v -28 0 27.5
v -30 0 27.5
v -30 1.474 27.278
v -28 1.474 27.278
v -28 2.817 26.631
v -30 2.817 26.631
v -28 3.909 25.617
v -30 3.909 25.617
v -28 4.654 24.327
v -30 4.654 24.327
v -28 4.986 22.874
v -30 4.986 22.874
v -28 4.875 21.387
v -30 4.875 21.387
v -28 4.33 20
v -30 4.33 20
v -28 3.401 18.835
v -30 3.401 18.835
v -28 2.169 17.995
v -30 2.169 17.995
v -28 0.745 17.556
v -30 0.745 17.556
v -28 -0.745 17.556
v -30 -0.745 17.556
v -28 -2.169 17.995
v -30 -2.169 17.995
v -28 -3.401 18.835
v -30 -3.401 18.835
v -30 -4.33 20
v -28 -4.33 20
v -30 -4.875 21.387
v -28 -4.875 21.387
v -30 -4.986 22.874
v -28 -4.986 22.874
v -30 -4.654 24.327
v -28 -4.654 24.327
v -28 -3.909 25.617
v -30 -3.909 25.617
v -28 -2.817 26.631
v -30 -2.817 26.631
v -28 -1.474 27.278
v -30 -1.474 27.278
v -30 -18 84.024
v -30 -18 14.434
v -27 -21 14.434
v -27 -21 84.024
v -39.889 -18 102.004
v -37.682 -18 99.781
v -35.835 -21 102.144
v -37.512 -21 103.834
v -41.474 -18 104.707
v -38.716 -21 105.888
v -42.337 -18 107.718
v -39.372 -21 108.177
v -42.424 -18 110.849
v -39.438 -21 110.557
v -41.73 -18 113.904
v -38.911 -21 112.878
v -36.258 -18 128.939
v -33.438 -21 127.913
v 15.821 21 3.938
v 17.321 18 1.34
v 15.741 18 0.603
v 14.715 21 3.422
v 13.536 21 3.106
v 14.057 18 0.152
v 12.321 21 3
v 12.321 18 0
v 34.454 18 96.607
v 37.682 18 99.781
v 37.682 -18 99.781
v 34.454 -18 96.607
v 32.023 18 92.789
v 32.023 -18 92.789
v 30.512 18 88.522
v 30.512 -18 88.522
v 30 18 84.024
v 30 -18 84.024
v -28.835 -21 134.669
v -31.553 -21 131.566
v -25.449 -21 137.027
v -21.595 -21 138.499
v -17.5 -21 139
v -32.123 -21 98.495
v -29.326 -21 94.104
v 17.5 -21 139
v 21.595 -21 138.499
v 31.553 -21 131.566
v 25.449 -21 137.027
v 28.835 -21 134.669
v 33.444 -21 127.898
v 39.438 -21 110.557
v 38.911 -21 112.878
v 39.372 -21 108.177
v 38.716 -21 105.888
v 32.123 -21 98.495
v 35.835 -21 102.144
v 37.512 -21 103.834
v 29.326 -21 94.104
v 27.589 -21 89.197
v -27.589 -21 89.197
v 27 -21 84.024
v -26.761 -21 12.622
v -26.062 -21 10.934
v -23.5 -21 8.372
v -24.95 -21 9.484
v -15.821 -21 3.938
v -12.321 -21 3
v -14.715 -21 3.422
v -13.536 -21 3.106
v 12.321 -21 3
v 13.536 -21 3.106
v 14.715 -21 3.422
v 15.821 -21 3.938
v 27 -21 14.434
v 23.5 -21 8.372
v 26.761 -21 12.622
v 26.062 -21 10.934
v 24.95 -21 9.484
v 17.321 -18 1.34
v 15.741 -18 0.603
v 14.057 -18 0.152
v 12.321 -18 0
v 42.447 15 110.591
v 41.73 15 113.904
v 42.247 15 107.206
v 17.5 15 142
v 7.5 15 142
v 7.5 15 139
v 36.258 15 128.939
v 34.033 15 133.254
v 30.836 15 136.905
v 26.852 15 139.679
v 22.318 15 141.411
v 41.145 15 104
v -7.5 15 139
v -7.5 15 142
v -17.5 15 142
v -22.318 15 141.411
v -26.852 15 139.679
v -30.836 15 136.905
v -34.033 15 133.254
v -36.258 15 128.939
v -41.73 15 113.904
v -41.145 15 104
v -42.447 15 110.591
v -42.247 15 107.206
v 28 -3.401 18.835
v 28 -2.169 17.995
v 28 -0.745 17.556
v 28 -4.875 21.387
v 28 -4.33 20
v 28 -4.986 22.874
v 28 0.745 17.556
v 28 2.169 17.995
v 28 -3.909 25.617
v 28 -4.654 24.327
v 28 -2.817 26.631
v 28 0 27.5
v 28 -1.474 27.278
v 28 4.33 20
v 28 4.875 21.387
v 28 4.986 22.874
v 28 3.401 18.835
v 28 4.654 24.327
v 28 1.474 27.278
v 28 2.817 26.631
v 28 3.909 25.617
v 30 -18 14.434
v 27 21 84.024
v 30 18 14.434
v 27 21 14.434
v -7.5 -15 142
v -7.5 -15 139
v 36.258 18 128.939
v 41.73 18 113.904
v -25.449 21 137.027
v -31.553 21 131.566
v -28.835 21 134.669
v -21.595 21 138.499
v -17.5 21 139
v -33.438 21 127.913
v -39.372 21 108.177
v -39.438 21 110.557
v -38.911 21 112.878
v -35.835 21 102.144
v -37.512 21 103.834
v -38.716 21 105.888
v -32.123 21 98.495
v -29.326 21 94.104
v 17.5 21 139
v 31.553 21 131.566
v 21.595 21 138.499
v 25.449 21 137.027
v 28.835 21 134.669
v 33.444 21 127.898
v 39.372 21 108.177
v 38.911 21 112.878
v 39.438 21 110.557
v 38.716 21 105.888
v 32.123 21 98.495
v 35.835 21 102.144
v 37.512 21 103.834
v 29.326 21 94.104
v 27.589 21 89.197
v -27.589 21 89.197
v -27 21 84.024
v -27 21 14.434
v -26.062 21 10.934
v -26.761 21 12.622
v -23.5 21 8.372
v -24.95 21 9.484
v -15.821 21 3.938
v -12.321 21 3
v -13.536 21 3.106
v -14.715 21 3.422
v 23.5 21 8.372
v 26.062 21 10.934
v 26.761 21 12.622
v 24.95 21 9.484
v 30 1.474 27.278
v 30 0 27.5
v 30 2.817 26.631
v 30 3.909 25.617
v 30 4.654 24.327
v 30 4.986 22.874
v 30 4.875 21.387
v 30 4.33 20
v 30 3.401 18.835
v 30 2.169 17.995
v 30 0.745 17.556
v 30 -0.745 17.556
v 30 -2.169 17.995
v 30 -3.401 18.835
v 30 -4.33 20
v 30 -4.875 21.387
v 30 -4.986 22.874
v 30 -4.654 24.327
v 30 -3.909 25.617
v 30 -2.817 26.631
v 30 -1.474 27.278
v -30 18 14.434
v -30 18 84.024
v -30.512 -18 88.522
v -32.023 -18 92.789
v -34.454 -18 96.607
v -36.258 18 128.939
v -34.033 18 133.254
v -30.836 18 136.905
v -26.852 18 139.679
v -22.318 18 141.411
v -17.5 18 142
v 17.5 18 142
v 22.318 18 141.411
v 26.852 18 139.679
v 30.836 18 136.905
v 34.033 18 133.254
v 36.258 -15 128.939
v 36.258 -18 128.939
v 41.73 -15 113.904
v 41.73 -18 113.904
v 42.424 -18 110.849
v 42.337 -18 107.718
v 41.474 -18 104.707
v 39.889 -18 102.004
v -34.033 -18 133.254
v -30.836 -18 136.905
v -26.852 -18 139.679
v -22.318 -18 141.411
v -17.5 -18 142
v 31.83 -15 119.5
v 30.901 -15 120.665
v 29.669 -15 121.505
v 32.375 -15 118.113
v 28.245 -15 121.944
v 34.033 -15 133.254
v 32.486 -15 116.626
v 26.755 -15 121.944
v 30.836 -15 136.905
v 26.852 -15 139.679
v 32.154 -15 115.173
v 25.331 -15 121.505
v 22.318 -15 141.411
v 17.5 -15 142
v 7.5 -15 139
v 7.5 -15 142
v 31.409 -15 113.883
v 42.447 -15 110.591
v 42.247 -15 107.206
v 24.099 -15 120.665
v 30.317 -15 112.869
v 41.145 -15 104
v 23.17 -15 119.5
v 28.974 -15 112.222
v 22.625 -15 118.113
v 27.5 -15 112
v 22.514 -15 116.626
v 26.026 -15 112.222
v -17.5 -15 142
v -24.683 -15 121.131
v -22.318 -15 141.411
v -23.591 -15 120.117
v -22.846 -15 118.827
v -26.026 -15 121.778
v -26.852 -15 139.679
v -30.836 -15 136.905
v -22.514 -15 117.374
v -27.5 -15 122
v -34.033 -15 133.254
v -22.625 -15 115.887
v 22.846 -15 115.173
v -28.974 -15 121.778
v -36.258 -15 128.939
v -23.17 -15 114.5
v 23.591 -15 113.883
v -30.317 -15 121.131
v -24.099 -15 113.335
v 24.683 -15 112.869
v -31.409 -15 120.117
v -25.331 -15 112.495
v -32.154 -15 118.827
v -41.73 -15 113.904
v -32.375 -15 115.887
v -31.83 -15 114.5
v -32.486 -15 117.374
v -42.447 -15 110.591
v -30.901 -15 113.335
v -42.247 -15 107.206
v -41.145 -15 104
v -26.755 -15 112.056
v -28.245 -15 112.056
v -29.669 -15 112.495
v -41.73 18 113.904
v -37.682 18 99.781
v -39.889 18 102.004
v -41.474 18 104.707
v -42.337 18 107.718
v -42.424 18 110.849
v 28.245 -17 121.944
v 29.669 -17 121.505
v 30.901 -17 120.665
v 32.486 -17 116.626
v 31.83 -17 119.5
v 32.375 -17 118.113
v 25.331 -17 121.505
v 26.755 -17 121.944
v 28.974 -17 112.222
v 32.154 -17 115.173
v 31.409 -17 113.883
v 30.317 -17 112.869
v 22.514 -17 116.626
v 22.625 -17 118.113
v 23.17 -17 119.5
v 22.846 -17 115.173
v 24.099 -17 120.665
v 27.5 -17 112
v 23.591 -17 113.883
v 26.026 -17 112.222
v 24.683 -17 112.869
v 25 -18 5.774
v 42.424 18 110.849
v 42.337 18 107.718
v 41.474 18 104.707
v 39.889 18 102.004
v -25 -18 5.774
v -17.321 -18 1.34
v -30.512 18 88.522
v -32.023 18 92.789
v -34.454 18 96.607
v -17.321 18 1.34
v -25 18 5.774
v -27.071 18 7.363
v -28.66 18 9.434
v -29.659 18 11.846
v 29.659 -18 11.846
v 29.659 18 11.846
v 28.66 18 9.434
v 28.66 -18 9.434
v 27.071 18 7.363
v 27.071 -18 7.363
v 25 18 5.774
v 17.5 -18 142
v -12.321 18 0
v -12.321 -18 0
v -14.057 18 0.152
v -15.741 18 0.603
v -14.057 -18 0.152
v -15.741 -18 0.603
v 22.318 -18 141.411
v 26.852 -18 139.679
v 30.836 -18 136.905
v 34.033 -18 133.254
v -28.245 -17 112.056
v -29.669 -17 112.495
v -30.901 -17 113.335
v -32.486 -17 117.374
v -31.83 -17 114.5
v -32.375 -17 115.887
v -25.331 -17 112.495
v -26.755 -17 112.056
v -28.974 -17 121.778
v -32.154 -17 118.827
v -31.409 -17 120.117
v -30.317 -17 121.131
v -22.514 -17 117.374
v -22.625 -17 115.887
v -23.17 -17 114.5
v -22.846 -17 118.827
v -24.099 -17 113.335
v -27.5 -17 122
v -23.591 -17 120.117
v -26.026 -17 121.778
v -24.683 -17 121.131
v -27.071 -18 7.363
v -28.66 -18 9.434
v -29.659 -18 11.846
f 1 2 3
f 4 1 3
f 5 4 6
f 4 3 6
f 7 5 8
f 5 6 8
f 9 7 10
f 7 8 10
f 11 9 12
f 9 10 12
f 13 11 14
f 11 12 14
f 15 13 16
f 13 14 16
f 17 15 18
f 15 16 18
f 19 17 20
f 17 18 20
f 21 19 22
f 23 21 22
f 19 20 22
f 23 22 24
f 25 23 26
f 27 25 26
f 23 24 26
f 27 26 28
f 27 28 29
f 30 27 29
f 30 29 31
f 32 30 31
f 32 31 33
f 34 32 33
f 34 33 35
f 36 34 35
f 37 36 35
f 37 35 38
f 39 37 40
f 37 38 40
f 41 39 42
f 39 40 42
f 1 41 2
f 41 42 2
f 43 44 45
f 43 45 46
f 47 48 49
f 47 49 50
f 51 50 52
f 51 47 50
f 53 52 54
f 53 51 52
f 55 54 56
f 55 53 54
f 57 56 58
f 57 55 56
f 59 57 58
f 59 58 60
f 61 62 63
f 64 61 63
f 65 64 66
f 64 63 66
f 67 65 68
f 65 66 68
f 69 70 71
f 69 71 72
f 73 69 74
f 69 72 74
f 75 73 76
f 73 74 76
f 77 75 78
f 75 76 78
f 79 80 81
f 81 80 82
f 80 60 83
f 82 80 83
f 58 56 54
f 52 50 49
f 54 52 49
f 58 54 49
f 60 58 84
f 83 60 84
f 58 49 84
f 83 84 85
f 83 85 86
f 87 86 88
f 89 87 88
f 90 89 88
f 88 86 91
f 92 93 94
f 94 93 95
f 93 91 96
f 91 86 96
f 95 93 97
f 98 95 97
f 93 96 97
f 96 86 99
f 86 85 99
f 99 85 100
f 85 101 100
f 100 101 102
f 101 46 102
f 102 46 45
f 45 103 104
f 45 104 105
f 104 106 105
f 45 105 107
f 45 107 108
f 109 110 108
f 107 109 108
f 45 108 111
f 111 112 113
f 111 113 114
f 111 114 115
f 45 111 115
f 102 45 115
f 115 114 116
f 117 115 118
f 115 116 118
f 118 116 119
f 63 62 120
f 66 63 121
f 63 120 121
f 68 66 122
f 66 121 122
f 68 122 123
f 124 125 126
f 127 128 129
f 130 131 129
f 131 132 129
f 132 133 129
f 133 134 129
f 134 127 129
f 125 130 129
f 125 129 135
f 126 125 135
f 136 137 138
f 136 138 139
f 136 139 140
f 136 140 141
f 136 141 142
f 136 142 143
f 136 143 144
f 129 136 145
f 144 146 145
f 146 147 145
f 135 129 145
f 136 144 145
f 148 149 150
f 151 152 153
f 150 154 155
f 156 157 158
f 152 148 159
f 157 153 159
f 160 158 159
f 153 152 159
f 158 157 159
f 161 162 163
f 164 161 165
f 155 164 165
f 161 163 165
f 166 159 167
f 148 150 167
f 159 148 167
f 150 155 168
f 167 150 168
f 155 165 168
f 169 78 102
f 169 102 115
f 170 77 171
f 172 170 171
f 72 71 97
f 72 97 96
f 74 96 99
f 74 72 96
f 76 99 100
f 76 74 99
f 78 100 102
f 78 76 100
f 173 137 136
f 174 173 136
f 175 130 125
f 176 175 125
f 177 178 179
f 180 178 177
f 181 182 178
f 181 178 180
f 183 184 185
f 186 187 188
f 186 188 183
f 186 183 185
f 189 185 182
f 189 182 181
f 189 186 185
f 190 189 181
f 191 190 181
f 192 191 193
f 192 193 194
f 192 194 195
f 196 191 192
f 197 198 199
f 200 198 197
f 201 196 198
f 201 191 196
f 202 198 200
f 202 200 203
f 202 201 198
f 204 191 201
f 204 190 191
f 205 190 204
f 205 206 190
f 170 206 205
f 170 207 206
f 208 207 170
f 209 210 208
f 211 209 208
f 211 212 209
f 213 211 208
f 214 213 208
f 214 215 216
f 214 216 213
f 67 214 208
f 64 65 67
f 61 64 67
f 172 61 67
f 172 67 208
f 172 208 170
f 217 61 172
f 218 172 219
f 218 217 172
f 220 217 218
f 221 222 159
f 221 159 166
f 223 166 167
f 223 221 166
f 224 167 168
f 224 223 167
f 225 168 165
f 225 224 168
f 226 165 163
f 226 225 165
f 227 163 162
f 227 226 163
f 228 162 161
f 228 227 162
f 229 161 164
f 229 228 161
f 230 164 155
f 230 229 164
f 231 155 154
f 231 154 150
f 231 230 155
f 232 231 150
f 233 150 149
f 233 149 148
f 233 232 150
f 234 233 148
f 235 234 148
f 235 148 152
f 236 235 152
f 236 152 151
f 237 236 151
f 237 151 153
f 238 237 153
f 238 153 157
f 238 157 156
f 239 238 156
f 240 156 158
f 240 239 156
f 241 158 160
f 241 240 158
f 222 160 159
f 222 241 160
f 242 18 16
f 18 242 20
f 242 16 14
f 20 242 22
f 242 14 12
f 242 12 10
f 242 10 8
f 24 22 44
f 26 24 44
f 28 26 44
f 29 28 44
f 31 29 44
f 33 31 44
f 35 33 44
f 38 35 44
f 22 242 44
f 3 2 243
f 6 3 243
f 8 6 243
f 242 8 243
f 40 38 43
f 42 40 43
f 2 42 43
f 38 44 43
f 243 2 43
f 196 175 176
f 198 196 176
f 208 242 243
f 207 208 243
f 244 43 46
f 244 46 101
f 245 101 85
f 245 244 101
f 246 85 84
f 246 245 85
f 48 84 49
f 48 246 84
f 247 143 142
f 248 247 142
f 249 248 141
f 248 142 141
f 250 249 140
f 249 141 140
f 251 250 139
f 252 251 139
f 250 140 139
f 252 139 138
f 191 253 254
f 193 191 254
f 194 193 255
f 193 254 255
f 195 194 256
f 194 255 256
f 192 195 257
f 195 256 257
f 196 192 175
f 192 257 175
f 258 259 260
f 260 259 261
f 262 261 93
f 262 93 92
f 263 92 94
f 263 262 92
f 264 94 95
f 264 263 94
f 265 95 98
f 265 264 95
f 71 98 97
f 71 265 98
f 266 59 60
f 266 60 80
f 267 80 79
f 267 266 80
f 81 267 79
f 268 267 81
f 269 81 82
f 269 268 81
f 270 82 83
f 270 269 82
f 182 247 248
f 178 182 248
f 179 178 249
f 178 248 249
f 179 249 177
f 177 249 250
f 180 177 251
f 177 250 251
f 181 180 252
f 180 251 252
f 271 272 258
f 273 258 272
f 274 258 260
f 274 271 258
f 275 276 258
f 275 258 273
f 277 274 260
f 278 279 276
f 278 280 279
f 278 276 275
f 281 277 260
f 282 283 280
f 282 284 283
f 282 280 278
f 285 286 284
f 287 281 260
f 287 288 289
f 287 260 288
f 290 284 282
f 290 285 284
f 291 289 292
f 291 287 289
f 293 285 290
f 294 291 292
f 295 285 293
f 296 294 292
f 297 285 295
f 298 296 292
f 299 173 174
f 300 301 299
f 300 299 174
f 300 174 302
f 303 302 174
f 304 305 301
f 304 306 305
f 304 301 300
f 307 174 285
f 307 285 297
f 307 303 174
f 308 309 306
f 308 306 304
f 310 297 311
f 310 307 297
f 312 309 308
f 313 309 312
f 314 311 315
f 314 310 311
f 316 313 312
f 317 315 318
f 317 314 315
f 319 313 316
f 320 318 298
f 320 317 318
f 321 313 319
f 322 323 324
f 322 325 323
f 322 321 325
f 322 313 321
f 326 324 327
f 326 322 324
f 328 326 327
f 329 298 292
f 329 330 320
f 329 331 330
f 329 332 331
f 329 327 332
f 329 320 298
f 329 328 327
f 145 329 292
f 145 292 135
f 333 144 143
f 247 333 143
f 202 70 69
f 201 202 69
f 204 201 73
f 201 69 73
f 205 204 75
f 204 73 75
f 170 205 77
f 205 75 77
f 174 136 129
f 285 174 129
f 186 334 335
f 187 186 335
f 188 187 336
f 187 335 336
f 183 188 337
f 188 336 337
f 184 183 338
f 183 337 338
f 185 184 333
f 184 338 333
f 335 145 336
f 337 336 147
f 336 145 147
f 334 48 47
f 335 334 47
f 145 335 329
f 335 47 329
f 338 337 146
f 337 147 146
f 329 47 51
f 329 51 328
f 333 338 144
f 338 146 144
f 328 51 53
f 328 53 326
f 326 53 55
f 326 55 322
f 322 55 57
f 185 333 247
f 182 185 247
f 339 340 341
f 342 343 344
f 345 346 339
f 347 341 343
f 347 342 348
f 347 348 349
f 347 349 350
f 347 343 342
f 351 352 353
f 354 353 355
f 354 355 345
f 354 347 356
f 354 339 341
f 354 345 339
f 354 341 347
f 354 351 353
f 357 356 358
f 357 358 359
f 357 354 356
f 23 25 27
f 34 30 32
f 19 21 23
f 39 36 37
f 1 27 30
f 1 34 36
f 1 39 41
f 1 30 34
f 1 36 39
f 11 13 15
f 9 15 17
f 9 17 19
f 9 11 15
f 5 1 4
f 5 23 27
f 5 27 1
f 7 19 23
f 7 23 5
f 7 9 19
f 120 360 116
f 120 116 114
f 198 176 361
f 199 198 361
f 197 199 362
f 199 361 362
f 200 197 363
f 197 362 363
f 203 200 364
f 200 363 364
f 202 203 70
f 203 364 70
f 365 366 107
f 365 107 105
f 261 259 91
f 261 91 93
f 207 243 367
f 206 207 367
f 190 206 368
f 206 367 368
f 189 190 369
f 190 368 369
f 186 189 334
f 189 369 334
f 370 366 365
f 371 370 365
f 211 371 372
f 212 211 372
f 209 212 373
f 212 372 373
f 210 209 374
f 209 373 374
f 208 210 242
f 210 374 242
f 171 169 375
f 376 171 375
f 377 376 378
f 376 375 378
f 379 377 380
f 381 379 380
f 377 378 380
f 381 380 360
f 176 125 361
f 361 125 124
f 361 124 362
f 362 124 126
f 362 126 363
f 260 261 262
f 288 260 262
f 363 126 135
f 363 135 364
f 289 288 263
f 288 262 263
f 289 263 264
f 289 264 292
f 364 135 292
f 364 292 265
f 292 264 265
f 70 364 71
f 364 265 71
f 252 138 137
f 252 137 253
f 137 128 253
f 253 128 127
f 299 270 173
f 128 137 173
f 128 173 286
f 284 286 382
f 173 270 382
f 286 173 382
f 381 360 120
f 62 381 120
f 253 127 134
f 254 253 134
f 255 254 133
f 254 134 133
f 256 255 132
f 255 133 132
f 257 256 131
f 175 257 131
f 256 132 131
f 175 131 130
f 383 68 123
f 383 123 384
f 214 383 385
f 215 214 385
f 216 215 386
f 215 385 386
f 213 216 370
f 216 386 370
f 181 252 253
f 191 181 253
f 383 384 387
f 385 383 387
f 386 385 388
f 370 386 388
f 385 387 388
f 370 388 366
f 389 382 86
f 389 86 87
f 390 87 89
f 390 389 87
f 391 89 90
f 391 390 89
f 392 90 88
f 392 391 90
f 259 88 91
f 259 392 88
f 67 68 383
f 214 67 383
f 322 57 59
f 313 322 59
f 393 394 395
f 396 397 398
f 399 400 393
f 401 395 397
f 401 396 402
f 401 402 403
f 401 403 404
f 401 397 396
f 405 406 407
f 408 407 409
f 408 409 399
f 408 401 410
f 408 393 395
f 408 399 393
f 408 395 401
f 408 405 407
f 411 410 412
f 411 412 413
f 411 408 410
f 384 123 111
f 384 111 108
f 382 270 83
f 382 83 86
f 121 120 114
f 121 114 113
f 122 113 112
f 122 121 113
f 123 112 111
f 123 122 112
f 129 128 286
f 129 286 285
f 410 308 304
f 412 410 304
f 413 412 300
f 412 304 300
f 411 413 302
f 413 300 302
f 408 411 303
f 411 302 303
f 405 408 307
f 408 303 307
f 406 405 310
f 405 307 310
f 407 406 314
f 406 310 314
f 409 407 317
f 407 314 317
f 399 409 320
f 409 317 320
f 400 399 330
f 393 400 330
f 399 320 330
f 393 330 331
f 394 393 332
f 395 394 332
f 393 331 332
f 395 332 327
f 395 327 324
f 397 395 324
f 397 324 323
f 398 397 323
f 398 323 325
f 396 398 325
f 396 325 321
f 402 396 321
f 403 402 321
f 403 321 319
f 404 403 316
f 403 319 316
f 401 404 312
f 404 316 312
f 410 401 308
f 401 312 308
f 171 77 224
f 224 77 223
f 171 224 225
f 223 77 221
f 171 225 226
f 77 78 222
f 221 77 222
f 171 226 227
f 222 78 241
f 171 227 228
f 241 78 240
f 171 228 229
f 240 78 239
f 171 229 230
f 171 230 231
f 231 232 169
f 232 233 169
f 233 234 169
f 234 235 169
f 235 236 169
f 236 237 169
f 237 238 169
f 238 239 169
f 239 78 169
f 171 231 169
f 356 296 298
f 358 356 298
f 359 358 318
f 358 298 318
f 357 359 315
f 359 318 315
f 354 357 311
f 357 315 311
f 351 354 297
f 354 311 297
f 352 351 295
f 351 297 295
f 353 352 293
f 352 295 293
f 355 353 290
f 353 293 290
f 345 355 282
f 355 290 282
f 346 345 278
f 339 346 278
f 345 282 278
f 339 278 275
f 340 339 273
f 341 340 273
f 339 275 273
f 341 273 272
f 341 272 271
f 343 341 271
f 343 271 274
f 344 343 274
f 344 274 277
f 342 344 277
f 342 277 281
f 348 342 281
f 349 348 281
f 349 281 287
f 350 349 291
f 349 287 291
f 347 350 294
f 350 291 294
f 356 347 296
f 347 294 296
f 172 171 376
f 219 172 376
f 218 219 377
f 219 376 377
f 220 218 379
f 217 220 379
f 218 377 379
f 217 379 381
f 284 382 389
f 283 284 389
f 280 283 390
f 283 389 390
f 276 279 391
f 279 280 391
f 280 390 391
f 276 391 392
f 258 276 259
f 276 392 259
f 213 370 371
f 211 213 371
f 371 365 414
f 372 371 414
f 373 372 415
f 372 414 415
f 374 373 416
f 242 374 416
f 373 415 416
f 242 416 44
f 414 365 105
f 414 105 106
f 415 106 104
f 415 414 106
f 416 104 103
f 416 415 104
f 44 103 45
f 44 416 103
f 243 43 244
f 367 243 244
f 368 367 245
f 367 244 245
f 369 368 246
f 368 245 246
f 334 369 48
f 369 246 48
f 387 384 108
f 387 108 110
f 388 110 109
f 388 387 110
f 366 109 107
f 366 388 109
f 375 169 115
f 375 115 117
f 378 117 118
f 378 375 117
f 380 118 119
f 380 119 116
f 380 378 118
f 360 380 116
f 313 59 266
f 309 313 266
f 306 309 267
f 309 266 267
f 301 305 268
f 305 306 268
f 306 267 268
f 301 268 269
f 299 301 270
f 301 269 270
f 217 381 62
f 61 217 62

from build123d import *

# Parameters (mm, degrees)
BOSS_EXTRUDE1_DEPTH      = 21
BOSS_EXTRUDE1_DEPTH_BACK = 21
CUT_EXTRUDE2_DEPTH       = 150.699259177
CUT_EXTRUDE2_DEPTH_BACK  = 150.699259177
SKETCH3_W                = 38
SKETCH3_H                = 30
CHAMFER1_SIZE            = 3
BOSS_EXTRUDE2_REACH      = 154.528
SKETCH4_W                = 15
SKETCH4_H                = 3
SKETCH5_R                = 5
CUT_EXTRUDE3_DEPTH       = 2
SKETCH6_R                = 5
CUT_EXTRUDE4_DEPTH       = 2


with BuildPart() as part:
    # Sketch1 → Boss-Extrude1 (new, two sides: drawn at the far end of the back side and taken through both)
    with BuildSketch(Plane(origin=(0, 0, 0), x_dir=(1, 0, 0), z_dir=(0, 1, 0)).offset(-BOSS_EXTRUDE1_DEPTH_BACK)):
        with BuildLine():
            Line((12.320508076, 0), (-12.320508076, 0))
            ThreePointArc((-12.320508076, 0), (-14.908698527, -0.340741737), (-17.320508076, -1.339745962))
            Line((-17.320508076, -1.339745962), (-25, -5.773502692))
            ThreePointArc((-25, -5.773502692), (-28.660254038, -9.43375673), (-30, -14.43375673))
            Line((-30, -14.43375673), (-30, -84.024253192))
            ThreePointArc((-30, -84.024253192), (-32.022876143, -92.789127283), (-37.682301783, -99.780975904))
            ThreePointArc((-37.682301783, -99.780975904), (-42, -106.185164374), (-41.729898157, -113.904179391))
            Line((-41.729898157, -113.904179391), (-36.257575864, -128.939261324))
            ThreePointArc((-36.257575864, -128.939261324), (-28.928358883, -138.413184128), (-17.5, -142))
            Line((-17.5, -142), (17.5, -142))
            ThreePointArc((17.5, -142), (28.928358883, -138.413184128), (36.257575864, -128.939261324))
            Line((36.257575864, -128.939261324), (41.729898157, -113.904179391))
            ThreePointArc((41.729898157, -113.904179391), (42, -106.185164374), (37.682301783, -99.780975904))
            ThreePointArc((37.682301783, -99.780975904), (32.022876143, -92.789127283), (30, -84.024253192))
            Line((30, -84.024253192), (30, -14.43375673))
            ThreePointArc((30, -14.43375673), (28.660254038, -9.43375673), (25, -5.773502692))
            Line((25, -5.773502692), (17.320508076, -1.339745962))
            ThreePointArc((17.320508076, -1.339745962), (14.908698527, -0.340741737), (12.320508076, 0))
        make_face()
    extrude(amount=BOSS_EXTRUDE1_DEPTH + BOSS_EXTRUDE1_DEPTH_BACK)

    # Sketch3 → Cut-Extrude2 (cut, two sides: drawn at the far end of the back side and taken through both)
    with BuildSketch(Plane(origin=(0, 0, 0), x_dir=(0, 0, -1), z_dir=(1, 0, 0)).offset(-CUT_EXTRUDE2_DEPTH_BACK)):
        with Locations((-123, 0)):
            Rectangle(SKETCH3_W, SKETCH3_H)
    extrude(amount=CUT_EXTRUDE2_DEPTH + CUT_EXTRUDE2_DEPTH_BACK, mode=Mode.SUBTRACT)

    # Chamfer1
    chamfer1_edges = [part.edges().sort_by_distance(p)[0] for p in [
        (-42, -21, 106.185164374),
        (-38.99373701, -21, 121.421720357),
        (-28.928358883, -21, 138.413184128),
        (0, -21, 142),
        (28.928358883, -21, 138.413184128),
        (38.99373701, -21, 121.421720357),
        (42, -21, 106.185164374),
        (32.022876143, -21, 92.789127283),
        (30, -21, 49.229004961),
        (28.660254038, -21, 9.43375673),
        (21.160254038, -21, 3.556624327),
        (14.908698527, -21, 0.340741737),
        (0, -21, 0),
        (-14.908698527, -21, 0.340741737),
        (-21.160254038, -21, 3.556624327),
        (-28.660254038, -21, 9.43375673),
        (-30, -21, 49.229004961),
        (-32.022876143, -21, 92.789127283),
        (-30, 21, 49.229004961),
        (-28.660254038, 21, 9.43375673),
        (-21.160254038, 21, 3.556624327),
        (-14.908698527, 21, 0.340741737),
        (0, 21, 0),
        (14.908698527, 21, 0.340741737),
        (21.160254038, 21, 3.556624327),
        (28.660254038, 21, 9.43375673),
        (30, 21, 49.229004961),
        (32.022876143, 21, 92.789127283),
        (42, 21, 106.185164374),
        (38.99373701, 21, 121.421720357),
        (28.928358883, 21, 138.413184128),
        (0, 21, 142),
        (-28.928358883, 21, 138.413184128),
        (-38.99373701, 21, 121.421720357),
        (-42, 21, 106.185164374),
        (-32.022876143, 21, 92.789127283),
    ]]
    chamfer(chamfer1_edges, length=CHAMFER1_SIZE)

    # Sketch4 → Boss-Extrude2 (add, up to next)
    with BuildSketch(Plane(origin=(0, -15, 0), x_dir=(1, 0, 0), z_dir=(0, 1, 0)), mode=Mode.PRIVATE) as boss_extrude2_sk1:
        with Locations((0, -140.5)):
            Rectangle(SKETCH4_W, SKETCH4_H)
    boss_extrude2_tool1 = extrude(boss_extrude2_sk1.sketch, amount=BOSS_EXTRUDE2_REACH, mode=Mode.PRIVATE) - part.part
    add(boss_extrude2_tool1.solids().sort_by_distance((0, -15, 140.5))[0])

    # Sketch5 → Cut-Extrude3 (cut)
    with BuildSketch(Plane(origin=(0, -15, 0), x_dir=(1, 0, 0), z_dir=(0, 1, 0))):
        with Locations((-27.5, -117)):
            Circle(SKETCH5_R)
        with Locations((27.5, -117)):
            Circle(SKETCH5_R)
    extrude(amount=-CUT_EXTRUDE3_DEPTH, mode=Mode.SUBTRACT)

    # Sketch6 → Cut-Extrude4 (cut)
    with BuildSketch(Plane.ZY.offset(30)):
        with Locations((22.5, 0)):
            Circle(SKETCH6_R)
    cut_extrude4 = extrude(amount=-CUT_EXTRUDE4_DEPTH, mode=Mode.SUBTRACT)

    # Mirror1: Cut-Extrude4 across plane
    add(cut_extrude4.mirror(Plane(origin=(0, 0, 0), x_dir=(0, 0, 1), z_dir=(1, 0, 0))), mode=Mode.SUBTRACT)


solid = part.part
